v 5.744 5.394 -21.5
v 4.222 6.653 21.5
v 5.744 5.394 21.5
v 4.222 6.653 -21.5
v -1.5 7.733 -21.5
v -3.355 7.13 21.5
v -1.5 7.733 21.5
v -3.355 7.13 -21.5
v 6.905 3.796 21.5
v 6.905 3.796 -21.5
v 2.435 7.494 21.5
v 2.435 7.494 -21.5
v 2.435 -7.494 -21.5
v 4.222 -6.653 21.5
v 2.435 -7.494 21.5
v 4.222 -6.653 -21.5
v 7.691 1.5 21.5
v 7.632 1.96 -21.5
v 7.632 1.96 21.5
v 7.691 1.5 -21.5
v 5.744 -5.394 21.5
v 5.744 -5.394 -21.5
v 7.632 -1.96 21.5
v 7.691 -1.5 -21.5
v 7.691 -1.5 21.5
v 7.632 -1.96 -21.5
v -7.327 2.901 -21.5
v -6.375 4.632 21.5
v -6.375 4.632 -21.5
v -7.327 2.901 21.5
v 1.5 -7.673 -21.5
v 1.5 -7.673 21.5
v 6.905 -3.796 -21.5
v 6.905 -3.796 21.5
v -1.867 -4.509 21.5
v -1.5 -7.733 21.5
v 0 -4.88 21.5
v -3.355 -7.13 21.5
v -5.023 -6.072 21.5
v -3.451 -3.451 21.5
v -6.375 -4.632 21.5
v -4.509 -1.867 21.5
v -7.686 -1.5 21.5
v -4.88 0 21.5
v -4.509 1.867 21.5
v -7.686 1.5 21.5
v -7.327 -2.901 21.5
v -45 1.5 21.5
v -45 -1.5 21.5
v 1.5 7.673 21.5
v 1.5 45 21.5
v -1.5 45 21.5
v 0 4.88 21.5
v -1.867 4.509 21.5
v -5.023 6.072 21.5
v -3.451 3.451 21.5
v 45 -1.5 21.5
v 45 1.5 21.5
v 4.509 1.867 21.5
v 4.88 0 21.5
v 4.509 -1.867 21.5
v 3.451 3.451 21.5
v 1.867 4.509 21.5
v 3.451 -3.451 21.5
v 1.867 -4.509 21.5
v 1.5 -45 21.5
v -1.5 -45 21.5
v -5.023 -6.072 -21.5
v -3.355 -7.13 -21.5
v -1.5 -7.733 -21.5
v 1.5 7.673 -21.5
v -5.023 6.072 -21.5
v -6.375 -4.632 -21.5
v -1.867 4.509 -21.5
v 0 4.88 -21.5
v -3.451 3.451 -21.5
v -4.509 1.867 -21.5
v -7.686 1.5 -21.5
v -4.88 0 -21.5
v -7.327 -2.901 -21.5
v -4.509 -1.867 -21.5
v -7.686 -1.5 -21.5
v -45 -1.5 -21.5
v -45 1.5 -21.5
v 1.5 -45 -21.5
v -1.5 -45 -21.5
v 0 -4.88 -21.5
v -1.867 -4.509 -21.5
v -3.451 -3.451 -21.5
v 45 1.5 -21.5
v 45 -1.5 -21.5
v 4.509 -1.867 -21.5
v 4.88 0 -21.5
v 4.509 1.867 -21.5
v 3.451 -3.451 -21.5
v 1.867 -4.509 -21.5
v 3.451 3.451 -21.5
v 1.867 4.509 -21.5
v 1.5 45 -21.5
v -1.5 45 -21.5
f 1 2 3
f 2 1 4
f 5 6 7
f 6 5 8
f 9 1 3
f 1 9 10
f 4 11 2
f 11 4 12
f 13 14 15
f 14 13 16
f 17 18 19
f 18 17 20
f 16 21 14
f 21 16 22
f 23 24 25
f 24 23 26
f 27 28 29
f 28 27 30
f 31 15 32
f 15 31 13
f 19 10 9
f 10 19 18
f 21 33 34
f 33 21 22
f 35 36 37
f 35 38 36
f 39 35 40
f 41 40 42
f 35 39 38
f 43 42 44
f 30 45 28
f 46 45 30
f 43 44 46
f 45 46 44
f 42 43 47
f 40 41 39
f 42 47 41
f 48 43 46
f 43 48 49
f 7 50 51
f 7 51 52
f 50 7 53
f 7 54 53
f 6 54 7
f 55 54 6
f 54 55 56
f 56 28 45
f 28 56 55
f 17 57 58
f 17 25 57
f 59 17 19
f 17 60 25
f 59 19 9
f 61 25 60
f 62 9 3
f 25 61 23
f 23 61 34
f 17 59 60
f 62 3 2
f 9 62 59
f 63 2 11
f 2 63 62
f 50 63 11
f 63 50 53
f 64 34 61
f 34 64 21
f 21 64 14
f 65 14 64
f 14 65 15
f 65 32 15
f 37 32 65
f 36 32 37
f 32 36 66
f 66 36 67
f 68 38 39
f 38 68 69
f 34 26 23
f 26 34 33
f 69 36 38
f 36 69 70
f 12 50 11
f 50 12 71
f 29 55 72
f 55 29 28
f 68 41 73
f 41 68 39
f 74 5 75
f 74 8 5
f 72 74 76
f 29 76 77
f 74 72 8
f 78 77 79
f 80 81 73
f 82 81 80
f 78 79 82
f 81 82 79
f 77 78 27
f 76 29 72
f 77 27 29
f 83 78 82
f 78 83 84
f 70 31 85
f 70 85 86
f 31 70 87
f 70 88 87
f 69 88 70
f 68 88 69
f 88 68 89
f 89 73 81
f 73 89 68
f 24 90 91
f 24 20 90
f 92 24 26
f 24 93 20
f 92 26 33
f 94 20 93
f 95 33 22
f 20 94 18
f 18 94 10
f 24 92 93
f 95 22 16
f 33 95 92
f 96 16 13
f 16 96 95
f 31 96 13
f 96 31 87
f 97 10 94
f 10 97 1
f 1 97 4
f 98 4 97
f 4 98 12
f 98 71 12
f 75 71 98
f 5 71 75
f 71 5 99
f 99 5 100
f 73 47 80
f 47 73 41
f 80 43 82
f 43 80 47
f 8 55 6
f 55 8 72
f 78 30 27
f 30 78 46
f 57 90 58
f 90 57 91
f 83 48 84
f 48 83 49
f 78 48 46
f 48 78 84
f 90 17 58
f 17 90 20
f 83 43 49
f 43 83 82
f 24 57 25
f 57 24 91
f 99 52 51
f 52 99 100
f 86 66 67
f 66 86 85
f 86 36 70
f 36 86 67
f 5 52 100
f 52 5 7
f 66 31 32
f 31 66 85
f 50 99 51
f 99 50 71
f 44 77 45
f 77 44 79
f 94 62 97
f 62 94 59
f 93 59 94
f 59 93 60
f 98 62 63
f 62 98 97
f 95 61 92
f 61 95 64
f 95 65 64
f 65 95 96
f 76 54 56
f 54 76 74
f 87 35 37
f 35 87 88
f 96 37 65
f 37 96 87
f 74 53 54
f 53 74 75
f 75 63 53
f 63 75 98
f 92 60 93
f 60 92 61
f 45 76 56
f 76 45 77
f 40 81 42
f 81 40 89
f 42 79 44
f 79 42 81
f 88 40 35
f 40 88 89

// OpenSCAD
height = 43;
radius = 4.88;
fin_len = 90;

difference () {
     union() {
	  cylinder (h=height, r=radius+3, center=true);
	  rotate(0) cube([fin_len,3,height], center=true);
	  rotate(90) cube([fin_len,3,height], center=true);
//	  rotate(120) cube([fin_len,3,height], center=true);
     }
     cylinder (h=height+1, r=radius, center=true);
}
     
/*
difference () {
     cylinder (h=height, r=radius+3, center=true);
     cylinder (h=height+1, r=radius, center=true);
     }

translate([(fin_len/2)+radius,(fin_len/2)-radius,0]) rotate(30) cube([fin_len,3,height], center=true);
translate([-(fin_len/2)-radius,(fin_len/2)-radius,0]) rotate(-30) cube([fin_len,3,height], center=true);

translate([0,-(fin_len/2)-radius,0]) rotate(90) cube([fin_len,3,height], center=true);
*/
